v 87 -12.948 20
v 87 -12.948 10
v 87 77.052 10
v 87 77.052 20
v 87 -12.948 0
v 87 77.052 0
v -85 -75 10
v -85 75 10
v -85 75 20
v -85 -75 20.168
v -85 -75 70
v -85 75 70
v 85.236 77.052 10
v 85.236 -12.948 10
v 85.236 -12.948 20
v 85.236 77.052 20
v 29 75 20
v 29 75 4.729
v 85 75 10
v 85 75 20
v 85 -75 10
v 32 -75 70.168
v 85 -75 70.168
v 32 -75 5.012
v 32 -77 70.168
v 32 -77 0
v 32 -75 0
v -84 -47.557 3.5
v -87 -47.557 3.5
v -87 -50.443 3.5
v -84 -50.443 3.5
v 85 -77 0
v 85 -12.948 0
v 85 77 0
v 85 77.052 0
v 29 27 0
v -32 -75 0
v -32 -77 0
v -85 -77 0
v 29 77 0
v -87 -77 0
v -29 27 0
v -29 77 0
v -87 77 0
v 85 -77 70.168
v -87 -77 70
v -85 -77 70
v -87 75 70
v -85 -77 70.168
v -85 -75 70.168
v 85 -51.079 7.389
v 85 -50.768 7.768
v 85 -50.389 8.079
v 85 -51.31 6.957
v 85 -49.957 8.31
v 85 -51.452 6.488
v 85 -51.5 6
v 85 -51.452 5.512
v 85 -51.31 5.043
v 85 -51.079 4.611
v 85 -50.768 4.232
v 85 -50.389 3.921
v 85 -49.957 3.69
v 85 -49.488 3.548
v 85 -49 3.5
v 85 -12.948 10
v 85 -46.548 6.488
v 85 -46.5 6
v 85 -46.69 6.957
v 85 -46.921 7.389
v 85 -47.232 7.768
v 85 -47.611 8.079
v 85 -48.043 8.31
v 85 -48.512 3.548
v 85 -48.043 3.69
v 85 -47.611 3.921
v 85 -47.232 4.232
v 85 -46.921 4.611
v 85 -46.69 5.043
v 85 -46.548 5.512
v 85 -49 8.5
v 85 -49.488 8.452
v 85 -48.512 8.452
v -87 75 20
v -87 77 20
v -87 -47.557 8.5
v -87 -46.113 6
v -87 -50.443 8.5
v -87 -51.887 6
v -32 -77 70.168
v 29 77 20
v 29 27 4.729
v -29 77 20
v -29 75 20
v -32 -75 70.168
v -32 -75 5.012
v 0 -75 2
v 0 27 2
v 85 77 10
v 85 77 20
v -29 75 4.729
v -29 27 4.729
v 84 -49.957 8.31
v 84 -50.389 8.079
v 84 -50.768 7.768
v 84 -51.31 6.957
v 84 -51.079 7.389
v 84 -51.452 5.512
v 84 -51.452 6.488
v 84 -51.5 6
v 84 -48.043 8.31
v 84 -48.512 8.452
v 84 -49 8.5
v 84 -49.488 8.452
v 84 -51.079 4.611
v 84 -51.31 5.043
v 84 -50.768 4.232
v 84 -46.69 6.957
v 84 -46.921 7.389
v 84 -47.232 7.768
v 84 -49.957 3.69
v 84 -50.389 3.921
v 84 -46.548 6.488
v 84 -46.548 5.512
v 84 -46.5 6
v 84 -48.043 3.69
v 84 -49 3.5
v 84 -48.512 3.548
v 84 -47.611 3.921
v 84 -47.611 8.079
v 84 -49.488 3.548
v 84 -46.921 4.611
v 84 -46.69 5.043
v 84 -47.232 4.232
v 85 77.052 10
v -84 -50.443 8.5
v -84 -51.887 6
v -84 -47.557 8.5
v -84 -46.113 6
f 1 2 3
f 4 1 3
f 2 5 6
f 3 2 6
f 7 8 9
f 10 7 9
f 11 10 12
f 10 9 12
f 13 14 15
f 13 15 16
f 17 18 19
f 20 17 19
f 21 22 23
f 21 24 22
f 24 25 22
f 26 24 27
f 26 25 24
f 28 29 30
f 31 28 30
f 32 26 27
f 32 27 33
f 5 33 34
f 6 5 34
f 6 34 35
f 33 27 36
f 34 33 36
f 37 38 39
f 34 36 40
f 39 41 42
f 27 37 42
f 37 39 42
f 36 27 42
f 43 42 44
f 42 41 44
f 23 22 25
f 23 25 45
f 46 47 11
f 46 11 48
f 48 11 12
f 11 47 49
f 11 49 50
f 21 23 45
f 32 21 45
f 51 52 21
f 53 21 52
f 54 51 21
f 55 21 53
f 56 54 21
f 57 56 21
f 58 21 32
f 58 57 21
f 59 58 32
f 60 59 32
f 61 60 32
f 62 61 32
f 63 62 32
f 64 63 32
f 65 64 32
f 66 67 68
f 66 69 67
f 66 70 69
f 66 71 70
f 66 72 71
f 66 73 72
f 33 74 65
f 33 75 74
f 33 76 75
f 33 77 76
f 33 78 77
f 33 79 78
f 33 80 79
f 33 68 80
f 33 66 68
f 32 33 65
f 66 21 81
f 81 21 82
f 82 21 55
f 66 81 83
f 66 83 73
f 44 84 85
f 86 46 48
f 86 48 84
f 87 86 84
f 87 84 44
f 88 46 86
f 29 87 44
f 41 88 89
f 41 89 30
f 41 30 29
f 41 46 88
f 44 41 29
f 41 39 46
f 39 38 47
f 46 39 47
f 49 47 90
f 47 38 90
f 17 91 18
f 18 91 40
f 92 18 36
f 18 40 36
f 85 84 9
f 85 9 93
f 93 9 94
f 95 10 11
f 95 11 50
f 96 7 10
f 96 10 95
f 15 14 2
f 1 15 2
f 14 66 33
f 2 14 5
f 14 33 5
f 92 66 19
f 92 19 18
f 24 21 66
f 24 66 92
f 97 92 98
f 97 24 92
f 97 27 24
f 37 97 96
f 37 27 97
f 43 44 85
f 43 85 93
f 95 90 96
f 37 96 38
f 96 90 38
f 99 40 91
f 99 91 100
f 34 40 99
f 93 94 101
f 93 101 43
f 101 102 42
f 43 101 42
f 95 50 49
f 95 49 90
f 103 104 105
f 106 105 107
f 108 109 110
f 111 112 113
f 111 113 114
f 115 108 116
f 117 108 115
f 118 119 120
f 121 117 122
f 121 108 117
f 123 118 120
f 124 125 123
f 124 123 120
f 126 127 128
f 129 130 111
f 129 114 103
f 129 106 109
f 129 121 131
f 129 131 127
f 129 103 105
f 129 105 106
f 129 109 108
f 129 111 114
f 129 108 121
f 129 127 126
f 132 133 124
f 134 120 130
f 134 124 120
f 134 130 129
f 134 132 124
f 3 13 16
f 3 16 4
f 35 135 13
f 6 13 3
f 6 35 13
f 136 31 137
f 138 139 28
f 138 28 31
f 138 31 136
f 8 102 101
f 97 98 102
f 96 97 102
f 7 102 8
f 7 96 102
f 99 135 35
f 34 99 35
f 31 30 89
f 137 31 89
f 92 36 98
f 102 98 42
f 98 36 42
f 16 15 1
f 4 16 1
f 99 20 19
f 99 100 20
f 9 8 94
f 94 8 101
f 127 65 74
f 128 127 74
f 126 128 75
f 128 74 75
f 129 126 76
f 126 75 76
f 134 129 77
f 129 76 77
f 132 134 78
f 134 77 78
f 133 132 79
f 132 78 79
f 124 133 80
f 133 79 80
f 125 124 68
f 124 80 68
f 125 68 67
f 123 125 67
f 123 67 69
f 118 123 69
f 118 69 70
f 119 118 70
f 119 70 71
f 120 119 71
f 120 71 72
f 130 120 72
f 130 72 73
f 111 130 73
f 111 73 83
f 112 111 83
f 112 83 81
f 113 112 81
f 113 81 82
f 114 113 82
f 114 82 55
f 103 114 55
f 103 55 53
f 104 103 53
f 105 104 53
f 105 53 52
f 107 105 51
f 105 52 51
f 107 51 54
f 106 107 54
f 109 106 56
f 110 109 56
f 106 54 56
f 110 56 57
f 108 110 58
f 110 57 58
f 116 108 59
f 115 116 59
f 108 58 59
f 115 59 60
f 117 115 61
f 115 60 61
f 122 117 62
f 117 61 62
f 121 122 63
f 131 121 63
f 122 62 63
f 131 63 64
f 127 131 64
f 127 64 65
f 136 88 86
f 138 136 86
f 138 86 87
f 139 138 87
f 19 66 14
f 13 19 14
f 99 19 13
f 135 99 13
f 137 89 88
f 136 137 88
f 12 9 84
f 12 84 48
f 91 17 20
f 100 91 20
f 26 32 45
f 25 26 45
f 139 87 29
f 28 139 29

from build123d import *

# Parameters (mm, degrees)
BOSS_EXTRU_1_DEPTH       = 10
ENL_V_MAT_EXTRU_1_DEPTH  = 173.699160392
ESQUISSE6_W              = 170
ESQUISSE6_H              = 20.167534305
BOSS_EXTRU_2_DEPTH       = 2
ESQUISSE8_W              = 185.001498893
ESQUISSE8_H              = 2
BOSS_EXTRU_3_DEPTH       = 50
ESQUISSE9_W              = 70
ESQUISSE9_H              = 152
BOSS_EXTRU_4_DEPTH       = 2
ESQUISSE10_W             = 69.947510153
ESQUISSE10_H             = 152
BOSS_EXTRU_5_DEPTH       = 2
ESQUISSE11_W             = 58
ESQUISSE11_H             = 20
BOSS_EXTRU_6_DEPTH       = 2
ESQUISSE19_W             = 64
ESQUISSE19_H             = 70.167534305
ENL_V_MAT_EXTRU_9_DEPTH  = 2
ESQUISSE24_R             = 2.5
ENL_V_MAT_EXTRU_10_DEPTH = 3
ENL_V_MAT_EXTRU_11_DEPTH = 3
ESQUISSE27_W             = 13.001498893
ESQUISSE27_H             = 50.044295801
ENL_V_MAT_EXTRU_12_DEPTH = 196.007134873
ESQUISSE28_W             = 70.169211379
ESQUISSE28_H             = 154
ENL_V_MAT_EXTRU_13_DEPTH = 2
ESQUISSE29_W             = 10
ESQUISSE29_H             = 90
BOSS_EXTRU_7_DEPTH       = 2
ESQUISSE30_W             = 1.763859519
ESQUISSE30_H             = 90
BOSS_EXTRU_8_DEPTH       = 10


with BuildPart() as part:
    # Esquisse1 → Boss.-Extru.1 (new body)
    with BuildSketch(Plane.XY):
        Polygon((-29, 27), (-29, 75), (-85, 75), (-85, -75), (85, -75), (85, 75), (29, 75), (29, 27), align=None)
    extrude(amount=BOSS_EXTRU_1_DEPTH)

    # Esquisse5 → Enlèv. mat.-Extru.1 (cut, through all)
    with BuildSketch(Plane.XZ.offset(75)):
        Polygon((-85, 10), (85, 10), (0, 2), align=None)
    extrude(amount=-ENL_V_MAT_EXTRU_1_DEPTH, mode=Mode.SUBTRACT)

    # Esquisse6 → Boss.-Extru.2 (add)
    with BuildSketch(Plane(origin=(0, -75, 0), x_dir=(-1, 0, 0), z_dir=(0, -1, 0))):
        with Locations((0, -10.083767153)):
            Rectangle(ESQUISSE6_W, ESQUISSE6_H)
    extrude(amount=BOSS_EXTRU_2_DEPTH)

    # Esquisse8 → Boss.-Extru.3 (add)
    with BuildSketch(Plane.XY.offset(20.167534305)):
        with Locations((7.500749447, -76)):
            Rectangle(ESQUISSE8_W, ESQUISSE8_H)
    extrude(amount=BOSS_EXTRU_3_DEPTH)

    # Esquisse9 → Boss.-Extru.4 (add)
    with BuildSketch(Plane.ZY.offset(85)):
        with Locations((35, -1)):
            Rectangle(ESQUISSE9_W, ESQUISSE9_H)
    extrude(amount=BOSS_EXTRU_4_DEPTH)

    # Esquisse10 → Boss.-Extru.5 (add)
    with BuildSketch(Plane(origin=(85, 0, 0), x_dir=(0, 0, -1), z_dir=(1, 0, 0))):
        with Locations((-34.973755077, -1)):
            Rectangle(ESQUISSE10_W, ESQUISSE10_H)
    extrude(amount=BOSS_EXTRU_5_DEPTH)

    # Esquisse11 → Boss.-Extru.6 (add)
    with BuildSketch(Plane(origin=(0, 75, 0), x_dir=(1, 0, 0), z_dir=(0, 1, 0))):
        with Locations((-58, -10)):
            Rectangle(ESQUISSE11_W, ESQUISSE11_H)
        with Locations((58, -10)):
            Rectangle(ESQUISSE11_W, ESQUISSE11_H)
    extrude(amount=BOSS_EXTRU_6_DEPTH)

    # Esquisse19 → Enlèv. mat.-Extru.9 (cut)
    with BuildSketch(Plane(origin=(0, -77, 0), x_dir=(-1, 0, 0), z_dir=(0, -1, 0))):
        with Locations((0, -35.083767153)):
            Rectangle(ESQUISSE19_W, ESQUISSE19_H)
    extrude(amount=-ENL_V_MAT_EXTRU_9_DEPTH, mode=Mode.SUBTRACT)

    # Esquisse24 → Enlèv. mat.-Extru.10 (cut)
    with BuildSketch(Plane(origin=(87, 0, 0), x_dir=(0, 0, -1), z_dir=(1, 0, 0))):
        with Locations((-6, -49)):
            Circle(ESQUISSE24_R)
    extrude(amount=-ENL_V_MAT_EXTRU_10_DEPTH, mode=Mode.SUBTRACT)

    # Esquisse25 → Enlèv. mat.-Extru.11 (cut)
    with BuildSketch(Plane.ZY.offset(87)):
        Polygon((6, -51.886751346), (8.5, -50.443375673), (8.5, -47.556624327), (6, -46.113248654), (3.5, -47.556624327), (3.5, -50.443375673), align=None)
    extrude(amount=-ENL_V_MAT_EXTRU_11_DEPTH, mode=Mode.SUBTRACT)

    # Esquisse27 → Enlèv. mat.-Extru.12 (cut, through all)
    with BuildSketch(Plane(origin=(0, -75, 0), x_dir=(1, 0, 0), z_dir=(0, 1, 0))):
        with Locations((93.500749447, -45.189682206)):
            Rectangle(ESQUISSE27_W, ESQUISSE27_H)
    extrude(amount=-ENL_V_MAT_EXTRU_12_DEPTH, mode=Mode.SUBTRACT)

    # Esquisse28 → Enlèv. mat.-Extru.13 (cut)
    with BuildSketch(Plane(origin=(87, 0, 0), x_dir=(0, 0, -1), z_dir=(1, 0, 0))):
        with Locations((-35.08460569, 0)):
            Rectangle(ESQUISSE28_W, ESQUISSE28_H)
    extrude(amount=-ENL_V_MAT_EXTRU_13_DEPTH, mode=Mode.SUBTRACT)

    # Esquisse29 → Boss.-Extru.7 (add)
    with BuildSketch(Plane(origin=(85, 0, 0), x_dir=(0, 0, -1), z_dir=(1, 0, 0))):
        with Locations((-5, 32.051779958)):
            Rectangle(ESQUISSE29_W, ESQUISSE29_H)
    extrude(amount=BOSS_EXTRU_7_DEPTH)

    # Esquisse30 → Boss.-Extru.8 (add)
    with BuildSketch(Plane.XY.offset(10)):
        with Locations((86.118070241, 32.051779958)):
            Rectangle(ESQUISSE30_W, ESQUISSE30_H)
    extrude(amount=BOSS_EXTRU_8_DEPTH)


solid = part.part
